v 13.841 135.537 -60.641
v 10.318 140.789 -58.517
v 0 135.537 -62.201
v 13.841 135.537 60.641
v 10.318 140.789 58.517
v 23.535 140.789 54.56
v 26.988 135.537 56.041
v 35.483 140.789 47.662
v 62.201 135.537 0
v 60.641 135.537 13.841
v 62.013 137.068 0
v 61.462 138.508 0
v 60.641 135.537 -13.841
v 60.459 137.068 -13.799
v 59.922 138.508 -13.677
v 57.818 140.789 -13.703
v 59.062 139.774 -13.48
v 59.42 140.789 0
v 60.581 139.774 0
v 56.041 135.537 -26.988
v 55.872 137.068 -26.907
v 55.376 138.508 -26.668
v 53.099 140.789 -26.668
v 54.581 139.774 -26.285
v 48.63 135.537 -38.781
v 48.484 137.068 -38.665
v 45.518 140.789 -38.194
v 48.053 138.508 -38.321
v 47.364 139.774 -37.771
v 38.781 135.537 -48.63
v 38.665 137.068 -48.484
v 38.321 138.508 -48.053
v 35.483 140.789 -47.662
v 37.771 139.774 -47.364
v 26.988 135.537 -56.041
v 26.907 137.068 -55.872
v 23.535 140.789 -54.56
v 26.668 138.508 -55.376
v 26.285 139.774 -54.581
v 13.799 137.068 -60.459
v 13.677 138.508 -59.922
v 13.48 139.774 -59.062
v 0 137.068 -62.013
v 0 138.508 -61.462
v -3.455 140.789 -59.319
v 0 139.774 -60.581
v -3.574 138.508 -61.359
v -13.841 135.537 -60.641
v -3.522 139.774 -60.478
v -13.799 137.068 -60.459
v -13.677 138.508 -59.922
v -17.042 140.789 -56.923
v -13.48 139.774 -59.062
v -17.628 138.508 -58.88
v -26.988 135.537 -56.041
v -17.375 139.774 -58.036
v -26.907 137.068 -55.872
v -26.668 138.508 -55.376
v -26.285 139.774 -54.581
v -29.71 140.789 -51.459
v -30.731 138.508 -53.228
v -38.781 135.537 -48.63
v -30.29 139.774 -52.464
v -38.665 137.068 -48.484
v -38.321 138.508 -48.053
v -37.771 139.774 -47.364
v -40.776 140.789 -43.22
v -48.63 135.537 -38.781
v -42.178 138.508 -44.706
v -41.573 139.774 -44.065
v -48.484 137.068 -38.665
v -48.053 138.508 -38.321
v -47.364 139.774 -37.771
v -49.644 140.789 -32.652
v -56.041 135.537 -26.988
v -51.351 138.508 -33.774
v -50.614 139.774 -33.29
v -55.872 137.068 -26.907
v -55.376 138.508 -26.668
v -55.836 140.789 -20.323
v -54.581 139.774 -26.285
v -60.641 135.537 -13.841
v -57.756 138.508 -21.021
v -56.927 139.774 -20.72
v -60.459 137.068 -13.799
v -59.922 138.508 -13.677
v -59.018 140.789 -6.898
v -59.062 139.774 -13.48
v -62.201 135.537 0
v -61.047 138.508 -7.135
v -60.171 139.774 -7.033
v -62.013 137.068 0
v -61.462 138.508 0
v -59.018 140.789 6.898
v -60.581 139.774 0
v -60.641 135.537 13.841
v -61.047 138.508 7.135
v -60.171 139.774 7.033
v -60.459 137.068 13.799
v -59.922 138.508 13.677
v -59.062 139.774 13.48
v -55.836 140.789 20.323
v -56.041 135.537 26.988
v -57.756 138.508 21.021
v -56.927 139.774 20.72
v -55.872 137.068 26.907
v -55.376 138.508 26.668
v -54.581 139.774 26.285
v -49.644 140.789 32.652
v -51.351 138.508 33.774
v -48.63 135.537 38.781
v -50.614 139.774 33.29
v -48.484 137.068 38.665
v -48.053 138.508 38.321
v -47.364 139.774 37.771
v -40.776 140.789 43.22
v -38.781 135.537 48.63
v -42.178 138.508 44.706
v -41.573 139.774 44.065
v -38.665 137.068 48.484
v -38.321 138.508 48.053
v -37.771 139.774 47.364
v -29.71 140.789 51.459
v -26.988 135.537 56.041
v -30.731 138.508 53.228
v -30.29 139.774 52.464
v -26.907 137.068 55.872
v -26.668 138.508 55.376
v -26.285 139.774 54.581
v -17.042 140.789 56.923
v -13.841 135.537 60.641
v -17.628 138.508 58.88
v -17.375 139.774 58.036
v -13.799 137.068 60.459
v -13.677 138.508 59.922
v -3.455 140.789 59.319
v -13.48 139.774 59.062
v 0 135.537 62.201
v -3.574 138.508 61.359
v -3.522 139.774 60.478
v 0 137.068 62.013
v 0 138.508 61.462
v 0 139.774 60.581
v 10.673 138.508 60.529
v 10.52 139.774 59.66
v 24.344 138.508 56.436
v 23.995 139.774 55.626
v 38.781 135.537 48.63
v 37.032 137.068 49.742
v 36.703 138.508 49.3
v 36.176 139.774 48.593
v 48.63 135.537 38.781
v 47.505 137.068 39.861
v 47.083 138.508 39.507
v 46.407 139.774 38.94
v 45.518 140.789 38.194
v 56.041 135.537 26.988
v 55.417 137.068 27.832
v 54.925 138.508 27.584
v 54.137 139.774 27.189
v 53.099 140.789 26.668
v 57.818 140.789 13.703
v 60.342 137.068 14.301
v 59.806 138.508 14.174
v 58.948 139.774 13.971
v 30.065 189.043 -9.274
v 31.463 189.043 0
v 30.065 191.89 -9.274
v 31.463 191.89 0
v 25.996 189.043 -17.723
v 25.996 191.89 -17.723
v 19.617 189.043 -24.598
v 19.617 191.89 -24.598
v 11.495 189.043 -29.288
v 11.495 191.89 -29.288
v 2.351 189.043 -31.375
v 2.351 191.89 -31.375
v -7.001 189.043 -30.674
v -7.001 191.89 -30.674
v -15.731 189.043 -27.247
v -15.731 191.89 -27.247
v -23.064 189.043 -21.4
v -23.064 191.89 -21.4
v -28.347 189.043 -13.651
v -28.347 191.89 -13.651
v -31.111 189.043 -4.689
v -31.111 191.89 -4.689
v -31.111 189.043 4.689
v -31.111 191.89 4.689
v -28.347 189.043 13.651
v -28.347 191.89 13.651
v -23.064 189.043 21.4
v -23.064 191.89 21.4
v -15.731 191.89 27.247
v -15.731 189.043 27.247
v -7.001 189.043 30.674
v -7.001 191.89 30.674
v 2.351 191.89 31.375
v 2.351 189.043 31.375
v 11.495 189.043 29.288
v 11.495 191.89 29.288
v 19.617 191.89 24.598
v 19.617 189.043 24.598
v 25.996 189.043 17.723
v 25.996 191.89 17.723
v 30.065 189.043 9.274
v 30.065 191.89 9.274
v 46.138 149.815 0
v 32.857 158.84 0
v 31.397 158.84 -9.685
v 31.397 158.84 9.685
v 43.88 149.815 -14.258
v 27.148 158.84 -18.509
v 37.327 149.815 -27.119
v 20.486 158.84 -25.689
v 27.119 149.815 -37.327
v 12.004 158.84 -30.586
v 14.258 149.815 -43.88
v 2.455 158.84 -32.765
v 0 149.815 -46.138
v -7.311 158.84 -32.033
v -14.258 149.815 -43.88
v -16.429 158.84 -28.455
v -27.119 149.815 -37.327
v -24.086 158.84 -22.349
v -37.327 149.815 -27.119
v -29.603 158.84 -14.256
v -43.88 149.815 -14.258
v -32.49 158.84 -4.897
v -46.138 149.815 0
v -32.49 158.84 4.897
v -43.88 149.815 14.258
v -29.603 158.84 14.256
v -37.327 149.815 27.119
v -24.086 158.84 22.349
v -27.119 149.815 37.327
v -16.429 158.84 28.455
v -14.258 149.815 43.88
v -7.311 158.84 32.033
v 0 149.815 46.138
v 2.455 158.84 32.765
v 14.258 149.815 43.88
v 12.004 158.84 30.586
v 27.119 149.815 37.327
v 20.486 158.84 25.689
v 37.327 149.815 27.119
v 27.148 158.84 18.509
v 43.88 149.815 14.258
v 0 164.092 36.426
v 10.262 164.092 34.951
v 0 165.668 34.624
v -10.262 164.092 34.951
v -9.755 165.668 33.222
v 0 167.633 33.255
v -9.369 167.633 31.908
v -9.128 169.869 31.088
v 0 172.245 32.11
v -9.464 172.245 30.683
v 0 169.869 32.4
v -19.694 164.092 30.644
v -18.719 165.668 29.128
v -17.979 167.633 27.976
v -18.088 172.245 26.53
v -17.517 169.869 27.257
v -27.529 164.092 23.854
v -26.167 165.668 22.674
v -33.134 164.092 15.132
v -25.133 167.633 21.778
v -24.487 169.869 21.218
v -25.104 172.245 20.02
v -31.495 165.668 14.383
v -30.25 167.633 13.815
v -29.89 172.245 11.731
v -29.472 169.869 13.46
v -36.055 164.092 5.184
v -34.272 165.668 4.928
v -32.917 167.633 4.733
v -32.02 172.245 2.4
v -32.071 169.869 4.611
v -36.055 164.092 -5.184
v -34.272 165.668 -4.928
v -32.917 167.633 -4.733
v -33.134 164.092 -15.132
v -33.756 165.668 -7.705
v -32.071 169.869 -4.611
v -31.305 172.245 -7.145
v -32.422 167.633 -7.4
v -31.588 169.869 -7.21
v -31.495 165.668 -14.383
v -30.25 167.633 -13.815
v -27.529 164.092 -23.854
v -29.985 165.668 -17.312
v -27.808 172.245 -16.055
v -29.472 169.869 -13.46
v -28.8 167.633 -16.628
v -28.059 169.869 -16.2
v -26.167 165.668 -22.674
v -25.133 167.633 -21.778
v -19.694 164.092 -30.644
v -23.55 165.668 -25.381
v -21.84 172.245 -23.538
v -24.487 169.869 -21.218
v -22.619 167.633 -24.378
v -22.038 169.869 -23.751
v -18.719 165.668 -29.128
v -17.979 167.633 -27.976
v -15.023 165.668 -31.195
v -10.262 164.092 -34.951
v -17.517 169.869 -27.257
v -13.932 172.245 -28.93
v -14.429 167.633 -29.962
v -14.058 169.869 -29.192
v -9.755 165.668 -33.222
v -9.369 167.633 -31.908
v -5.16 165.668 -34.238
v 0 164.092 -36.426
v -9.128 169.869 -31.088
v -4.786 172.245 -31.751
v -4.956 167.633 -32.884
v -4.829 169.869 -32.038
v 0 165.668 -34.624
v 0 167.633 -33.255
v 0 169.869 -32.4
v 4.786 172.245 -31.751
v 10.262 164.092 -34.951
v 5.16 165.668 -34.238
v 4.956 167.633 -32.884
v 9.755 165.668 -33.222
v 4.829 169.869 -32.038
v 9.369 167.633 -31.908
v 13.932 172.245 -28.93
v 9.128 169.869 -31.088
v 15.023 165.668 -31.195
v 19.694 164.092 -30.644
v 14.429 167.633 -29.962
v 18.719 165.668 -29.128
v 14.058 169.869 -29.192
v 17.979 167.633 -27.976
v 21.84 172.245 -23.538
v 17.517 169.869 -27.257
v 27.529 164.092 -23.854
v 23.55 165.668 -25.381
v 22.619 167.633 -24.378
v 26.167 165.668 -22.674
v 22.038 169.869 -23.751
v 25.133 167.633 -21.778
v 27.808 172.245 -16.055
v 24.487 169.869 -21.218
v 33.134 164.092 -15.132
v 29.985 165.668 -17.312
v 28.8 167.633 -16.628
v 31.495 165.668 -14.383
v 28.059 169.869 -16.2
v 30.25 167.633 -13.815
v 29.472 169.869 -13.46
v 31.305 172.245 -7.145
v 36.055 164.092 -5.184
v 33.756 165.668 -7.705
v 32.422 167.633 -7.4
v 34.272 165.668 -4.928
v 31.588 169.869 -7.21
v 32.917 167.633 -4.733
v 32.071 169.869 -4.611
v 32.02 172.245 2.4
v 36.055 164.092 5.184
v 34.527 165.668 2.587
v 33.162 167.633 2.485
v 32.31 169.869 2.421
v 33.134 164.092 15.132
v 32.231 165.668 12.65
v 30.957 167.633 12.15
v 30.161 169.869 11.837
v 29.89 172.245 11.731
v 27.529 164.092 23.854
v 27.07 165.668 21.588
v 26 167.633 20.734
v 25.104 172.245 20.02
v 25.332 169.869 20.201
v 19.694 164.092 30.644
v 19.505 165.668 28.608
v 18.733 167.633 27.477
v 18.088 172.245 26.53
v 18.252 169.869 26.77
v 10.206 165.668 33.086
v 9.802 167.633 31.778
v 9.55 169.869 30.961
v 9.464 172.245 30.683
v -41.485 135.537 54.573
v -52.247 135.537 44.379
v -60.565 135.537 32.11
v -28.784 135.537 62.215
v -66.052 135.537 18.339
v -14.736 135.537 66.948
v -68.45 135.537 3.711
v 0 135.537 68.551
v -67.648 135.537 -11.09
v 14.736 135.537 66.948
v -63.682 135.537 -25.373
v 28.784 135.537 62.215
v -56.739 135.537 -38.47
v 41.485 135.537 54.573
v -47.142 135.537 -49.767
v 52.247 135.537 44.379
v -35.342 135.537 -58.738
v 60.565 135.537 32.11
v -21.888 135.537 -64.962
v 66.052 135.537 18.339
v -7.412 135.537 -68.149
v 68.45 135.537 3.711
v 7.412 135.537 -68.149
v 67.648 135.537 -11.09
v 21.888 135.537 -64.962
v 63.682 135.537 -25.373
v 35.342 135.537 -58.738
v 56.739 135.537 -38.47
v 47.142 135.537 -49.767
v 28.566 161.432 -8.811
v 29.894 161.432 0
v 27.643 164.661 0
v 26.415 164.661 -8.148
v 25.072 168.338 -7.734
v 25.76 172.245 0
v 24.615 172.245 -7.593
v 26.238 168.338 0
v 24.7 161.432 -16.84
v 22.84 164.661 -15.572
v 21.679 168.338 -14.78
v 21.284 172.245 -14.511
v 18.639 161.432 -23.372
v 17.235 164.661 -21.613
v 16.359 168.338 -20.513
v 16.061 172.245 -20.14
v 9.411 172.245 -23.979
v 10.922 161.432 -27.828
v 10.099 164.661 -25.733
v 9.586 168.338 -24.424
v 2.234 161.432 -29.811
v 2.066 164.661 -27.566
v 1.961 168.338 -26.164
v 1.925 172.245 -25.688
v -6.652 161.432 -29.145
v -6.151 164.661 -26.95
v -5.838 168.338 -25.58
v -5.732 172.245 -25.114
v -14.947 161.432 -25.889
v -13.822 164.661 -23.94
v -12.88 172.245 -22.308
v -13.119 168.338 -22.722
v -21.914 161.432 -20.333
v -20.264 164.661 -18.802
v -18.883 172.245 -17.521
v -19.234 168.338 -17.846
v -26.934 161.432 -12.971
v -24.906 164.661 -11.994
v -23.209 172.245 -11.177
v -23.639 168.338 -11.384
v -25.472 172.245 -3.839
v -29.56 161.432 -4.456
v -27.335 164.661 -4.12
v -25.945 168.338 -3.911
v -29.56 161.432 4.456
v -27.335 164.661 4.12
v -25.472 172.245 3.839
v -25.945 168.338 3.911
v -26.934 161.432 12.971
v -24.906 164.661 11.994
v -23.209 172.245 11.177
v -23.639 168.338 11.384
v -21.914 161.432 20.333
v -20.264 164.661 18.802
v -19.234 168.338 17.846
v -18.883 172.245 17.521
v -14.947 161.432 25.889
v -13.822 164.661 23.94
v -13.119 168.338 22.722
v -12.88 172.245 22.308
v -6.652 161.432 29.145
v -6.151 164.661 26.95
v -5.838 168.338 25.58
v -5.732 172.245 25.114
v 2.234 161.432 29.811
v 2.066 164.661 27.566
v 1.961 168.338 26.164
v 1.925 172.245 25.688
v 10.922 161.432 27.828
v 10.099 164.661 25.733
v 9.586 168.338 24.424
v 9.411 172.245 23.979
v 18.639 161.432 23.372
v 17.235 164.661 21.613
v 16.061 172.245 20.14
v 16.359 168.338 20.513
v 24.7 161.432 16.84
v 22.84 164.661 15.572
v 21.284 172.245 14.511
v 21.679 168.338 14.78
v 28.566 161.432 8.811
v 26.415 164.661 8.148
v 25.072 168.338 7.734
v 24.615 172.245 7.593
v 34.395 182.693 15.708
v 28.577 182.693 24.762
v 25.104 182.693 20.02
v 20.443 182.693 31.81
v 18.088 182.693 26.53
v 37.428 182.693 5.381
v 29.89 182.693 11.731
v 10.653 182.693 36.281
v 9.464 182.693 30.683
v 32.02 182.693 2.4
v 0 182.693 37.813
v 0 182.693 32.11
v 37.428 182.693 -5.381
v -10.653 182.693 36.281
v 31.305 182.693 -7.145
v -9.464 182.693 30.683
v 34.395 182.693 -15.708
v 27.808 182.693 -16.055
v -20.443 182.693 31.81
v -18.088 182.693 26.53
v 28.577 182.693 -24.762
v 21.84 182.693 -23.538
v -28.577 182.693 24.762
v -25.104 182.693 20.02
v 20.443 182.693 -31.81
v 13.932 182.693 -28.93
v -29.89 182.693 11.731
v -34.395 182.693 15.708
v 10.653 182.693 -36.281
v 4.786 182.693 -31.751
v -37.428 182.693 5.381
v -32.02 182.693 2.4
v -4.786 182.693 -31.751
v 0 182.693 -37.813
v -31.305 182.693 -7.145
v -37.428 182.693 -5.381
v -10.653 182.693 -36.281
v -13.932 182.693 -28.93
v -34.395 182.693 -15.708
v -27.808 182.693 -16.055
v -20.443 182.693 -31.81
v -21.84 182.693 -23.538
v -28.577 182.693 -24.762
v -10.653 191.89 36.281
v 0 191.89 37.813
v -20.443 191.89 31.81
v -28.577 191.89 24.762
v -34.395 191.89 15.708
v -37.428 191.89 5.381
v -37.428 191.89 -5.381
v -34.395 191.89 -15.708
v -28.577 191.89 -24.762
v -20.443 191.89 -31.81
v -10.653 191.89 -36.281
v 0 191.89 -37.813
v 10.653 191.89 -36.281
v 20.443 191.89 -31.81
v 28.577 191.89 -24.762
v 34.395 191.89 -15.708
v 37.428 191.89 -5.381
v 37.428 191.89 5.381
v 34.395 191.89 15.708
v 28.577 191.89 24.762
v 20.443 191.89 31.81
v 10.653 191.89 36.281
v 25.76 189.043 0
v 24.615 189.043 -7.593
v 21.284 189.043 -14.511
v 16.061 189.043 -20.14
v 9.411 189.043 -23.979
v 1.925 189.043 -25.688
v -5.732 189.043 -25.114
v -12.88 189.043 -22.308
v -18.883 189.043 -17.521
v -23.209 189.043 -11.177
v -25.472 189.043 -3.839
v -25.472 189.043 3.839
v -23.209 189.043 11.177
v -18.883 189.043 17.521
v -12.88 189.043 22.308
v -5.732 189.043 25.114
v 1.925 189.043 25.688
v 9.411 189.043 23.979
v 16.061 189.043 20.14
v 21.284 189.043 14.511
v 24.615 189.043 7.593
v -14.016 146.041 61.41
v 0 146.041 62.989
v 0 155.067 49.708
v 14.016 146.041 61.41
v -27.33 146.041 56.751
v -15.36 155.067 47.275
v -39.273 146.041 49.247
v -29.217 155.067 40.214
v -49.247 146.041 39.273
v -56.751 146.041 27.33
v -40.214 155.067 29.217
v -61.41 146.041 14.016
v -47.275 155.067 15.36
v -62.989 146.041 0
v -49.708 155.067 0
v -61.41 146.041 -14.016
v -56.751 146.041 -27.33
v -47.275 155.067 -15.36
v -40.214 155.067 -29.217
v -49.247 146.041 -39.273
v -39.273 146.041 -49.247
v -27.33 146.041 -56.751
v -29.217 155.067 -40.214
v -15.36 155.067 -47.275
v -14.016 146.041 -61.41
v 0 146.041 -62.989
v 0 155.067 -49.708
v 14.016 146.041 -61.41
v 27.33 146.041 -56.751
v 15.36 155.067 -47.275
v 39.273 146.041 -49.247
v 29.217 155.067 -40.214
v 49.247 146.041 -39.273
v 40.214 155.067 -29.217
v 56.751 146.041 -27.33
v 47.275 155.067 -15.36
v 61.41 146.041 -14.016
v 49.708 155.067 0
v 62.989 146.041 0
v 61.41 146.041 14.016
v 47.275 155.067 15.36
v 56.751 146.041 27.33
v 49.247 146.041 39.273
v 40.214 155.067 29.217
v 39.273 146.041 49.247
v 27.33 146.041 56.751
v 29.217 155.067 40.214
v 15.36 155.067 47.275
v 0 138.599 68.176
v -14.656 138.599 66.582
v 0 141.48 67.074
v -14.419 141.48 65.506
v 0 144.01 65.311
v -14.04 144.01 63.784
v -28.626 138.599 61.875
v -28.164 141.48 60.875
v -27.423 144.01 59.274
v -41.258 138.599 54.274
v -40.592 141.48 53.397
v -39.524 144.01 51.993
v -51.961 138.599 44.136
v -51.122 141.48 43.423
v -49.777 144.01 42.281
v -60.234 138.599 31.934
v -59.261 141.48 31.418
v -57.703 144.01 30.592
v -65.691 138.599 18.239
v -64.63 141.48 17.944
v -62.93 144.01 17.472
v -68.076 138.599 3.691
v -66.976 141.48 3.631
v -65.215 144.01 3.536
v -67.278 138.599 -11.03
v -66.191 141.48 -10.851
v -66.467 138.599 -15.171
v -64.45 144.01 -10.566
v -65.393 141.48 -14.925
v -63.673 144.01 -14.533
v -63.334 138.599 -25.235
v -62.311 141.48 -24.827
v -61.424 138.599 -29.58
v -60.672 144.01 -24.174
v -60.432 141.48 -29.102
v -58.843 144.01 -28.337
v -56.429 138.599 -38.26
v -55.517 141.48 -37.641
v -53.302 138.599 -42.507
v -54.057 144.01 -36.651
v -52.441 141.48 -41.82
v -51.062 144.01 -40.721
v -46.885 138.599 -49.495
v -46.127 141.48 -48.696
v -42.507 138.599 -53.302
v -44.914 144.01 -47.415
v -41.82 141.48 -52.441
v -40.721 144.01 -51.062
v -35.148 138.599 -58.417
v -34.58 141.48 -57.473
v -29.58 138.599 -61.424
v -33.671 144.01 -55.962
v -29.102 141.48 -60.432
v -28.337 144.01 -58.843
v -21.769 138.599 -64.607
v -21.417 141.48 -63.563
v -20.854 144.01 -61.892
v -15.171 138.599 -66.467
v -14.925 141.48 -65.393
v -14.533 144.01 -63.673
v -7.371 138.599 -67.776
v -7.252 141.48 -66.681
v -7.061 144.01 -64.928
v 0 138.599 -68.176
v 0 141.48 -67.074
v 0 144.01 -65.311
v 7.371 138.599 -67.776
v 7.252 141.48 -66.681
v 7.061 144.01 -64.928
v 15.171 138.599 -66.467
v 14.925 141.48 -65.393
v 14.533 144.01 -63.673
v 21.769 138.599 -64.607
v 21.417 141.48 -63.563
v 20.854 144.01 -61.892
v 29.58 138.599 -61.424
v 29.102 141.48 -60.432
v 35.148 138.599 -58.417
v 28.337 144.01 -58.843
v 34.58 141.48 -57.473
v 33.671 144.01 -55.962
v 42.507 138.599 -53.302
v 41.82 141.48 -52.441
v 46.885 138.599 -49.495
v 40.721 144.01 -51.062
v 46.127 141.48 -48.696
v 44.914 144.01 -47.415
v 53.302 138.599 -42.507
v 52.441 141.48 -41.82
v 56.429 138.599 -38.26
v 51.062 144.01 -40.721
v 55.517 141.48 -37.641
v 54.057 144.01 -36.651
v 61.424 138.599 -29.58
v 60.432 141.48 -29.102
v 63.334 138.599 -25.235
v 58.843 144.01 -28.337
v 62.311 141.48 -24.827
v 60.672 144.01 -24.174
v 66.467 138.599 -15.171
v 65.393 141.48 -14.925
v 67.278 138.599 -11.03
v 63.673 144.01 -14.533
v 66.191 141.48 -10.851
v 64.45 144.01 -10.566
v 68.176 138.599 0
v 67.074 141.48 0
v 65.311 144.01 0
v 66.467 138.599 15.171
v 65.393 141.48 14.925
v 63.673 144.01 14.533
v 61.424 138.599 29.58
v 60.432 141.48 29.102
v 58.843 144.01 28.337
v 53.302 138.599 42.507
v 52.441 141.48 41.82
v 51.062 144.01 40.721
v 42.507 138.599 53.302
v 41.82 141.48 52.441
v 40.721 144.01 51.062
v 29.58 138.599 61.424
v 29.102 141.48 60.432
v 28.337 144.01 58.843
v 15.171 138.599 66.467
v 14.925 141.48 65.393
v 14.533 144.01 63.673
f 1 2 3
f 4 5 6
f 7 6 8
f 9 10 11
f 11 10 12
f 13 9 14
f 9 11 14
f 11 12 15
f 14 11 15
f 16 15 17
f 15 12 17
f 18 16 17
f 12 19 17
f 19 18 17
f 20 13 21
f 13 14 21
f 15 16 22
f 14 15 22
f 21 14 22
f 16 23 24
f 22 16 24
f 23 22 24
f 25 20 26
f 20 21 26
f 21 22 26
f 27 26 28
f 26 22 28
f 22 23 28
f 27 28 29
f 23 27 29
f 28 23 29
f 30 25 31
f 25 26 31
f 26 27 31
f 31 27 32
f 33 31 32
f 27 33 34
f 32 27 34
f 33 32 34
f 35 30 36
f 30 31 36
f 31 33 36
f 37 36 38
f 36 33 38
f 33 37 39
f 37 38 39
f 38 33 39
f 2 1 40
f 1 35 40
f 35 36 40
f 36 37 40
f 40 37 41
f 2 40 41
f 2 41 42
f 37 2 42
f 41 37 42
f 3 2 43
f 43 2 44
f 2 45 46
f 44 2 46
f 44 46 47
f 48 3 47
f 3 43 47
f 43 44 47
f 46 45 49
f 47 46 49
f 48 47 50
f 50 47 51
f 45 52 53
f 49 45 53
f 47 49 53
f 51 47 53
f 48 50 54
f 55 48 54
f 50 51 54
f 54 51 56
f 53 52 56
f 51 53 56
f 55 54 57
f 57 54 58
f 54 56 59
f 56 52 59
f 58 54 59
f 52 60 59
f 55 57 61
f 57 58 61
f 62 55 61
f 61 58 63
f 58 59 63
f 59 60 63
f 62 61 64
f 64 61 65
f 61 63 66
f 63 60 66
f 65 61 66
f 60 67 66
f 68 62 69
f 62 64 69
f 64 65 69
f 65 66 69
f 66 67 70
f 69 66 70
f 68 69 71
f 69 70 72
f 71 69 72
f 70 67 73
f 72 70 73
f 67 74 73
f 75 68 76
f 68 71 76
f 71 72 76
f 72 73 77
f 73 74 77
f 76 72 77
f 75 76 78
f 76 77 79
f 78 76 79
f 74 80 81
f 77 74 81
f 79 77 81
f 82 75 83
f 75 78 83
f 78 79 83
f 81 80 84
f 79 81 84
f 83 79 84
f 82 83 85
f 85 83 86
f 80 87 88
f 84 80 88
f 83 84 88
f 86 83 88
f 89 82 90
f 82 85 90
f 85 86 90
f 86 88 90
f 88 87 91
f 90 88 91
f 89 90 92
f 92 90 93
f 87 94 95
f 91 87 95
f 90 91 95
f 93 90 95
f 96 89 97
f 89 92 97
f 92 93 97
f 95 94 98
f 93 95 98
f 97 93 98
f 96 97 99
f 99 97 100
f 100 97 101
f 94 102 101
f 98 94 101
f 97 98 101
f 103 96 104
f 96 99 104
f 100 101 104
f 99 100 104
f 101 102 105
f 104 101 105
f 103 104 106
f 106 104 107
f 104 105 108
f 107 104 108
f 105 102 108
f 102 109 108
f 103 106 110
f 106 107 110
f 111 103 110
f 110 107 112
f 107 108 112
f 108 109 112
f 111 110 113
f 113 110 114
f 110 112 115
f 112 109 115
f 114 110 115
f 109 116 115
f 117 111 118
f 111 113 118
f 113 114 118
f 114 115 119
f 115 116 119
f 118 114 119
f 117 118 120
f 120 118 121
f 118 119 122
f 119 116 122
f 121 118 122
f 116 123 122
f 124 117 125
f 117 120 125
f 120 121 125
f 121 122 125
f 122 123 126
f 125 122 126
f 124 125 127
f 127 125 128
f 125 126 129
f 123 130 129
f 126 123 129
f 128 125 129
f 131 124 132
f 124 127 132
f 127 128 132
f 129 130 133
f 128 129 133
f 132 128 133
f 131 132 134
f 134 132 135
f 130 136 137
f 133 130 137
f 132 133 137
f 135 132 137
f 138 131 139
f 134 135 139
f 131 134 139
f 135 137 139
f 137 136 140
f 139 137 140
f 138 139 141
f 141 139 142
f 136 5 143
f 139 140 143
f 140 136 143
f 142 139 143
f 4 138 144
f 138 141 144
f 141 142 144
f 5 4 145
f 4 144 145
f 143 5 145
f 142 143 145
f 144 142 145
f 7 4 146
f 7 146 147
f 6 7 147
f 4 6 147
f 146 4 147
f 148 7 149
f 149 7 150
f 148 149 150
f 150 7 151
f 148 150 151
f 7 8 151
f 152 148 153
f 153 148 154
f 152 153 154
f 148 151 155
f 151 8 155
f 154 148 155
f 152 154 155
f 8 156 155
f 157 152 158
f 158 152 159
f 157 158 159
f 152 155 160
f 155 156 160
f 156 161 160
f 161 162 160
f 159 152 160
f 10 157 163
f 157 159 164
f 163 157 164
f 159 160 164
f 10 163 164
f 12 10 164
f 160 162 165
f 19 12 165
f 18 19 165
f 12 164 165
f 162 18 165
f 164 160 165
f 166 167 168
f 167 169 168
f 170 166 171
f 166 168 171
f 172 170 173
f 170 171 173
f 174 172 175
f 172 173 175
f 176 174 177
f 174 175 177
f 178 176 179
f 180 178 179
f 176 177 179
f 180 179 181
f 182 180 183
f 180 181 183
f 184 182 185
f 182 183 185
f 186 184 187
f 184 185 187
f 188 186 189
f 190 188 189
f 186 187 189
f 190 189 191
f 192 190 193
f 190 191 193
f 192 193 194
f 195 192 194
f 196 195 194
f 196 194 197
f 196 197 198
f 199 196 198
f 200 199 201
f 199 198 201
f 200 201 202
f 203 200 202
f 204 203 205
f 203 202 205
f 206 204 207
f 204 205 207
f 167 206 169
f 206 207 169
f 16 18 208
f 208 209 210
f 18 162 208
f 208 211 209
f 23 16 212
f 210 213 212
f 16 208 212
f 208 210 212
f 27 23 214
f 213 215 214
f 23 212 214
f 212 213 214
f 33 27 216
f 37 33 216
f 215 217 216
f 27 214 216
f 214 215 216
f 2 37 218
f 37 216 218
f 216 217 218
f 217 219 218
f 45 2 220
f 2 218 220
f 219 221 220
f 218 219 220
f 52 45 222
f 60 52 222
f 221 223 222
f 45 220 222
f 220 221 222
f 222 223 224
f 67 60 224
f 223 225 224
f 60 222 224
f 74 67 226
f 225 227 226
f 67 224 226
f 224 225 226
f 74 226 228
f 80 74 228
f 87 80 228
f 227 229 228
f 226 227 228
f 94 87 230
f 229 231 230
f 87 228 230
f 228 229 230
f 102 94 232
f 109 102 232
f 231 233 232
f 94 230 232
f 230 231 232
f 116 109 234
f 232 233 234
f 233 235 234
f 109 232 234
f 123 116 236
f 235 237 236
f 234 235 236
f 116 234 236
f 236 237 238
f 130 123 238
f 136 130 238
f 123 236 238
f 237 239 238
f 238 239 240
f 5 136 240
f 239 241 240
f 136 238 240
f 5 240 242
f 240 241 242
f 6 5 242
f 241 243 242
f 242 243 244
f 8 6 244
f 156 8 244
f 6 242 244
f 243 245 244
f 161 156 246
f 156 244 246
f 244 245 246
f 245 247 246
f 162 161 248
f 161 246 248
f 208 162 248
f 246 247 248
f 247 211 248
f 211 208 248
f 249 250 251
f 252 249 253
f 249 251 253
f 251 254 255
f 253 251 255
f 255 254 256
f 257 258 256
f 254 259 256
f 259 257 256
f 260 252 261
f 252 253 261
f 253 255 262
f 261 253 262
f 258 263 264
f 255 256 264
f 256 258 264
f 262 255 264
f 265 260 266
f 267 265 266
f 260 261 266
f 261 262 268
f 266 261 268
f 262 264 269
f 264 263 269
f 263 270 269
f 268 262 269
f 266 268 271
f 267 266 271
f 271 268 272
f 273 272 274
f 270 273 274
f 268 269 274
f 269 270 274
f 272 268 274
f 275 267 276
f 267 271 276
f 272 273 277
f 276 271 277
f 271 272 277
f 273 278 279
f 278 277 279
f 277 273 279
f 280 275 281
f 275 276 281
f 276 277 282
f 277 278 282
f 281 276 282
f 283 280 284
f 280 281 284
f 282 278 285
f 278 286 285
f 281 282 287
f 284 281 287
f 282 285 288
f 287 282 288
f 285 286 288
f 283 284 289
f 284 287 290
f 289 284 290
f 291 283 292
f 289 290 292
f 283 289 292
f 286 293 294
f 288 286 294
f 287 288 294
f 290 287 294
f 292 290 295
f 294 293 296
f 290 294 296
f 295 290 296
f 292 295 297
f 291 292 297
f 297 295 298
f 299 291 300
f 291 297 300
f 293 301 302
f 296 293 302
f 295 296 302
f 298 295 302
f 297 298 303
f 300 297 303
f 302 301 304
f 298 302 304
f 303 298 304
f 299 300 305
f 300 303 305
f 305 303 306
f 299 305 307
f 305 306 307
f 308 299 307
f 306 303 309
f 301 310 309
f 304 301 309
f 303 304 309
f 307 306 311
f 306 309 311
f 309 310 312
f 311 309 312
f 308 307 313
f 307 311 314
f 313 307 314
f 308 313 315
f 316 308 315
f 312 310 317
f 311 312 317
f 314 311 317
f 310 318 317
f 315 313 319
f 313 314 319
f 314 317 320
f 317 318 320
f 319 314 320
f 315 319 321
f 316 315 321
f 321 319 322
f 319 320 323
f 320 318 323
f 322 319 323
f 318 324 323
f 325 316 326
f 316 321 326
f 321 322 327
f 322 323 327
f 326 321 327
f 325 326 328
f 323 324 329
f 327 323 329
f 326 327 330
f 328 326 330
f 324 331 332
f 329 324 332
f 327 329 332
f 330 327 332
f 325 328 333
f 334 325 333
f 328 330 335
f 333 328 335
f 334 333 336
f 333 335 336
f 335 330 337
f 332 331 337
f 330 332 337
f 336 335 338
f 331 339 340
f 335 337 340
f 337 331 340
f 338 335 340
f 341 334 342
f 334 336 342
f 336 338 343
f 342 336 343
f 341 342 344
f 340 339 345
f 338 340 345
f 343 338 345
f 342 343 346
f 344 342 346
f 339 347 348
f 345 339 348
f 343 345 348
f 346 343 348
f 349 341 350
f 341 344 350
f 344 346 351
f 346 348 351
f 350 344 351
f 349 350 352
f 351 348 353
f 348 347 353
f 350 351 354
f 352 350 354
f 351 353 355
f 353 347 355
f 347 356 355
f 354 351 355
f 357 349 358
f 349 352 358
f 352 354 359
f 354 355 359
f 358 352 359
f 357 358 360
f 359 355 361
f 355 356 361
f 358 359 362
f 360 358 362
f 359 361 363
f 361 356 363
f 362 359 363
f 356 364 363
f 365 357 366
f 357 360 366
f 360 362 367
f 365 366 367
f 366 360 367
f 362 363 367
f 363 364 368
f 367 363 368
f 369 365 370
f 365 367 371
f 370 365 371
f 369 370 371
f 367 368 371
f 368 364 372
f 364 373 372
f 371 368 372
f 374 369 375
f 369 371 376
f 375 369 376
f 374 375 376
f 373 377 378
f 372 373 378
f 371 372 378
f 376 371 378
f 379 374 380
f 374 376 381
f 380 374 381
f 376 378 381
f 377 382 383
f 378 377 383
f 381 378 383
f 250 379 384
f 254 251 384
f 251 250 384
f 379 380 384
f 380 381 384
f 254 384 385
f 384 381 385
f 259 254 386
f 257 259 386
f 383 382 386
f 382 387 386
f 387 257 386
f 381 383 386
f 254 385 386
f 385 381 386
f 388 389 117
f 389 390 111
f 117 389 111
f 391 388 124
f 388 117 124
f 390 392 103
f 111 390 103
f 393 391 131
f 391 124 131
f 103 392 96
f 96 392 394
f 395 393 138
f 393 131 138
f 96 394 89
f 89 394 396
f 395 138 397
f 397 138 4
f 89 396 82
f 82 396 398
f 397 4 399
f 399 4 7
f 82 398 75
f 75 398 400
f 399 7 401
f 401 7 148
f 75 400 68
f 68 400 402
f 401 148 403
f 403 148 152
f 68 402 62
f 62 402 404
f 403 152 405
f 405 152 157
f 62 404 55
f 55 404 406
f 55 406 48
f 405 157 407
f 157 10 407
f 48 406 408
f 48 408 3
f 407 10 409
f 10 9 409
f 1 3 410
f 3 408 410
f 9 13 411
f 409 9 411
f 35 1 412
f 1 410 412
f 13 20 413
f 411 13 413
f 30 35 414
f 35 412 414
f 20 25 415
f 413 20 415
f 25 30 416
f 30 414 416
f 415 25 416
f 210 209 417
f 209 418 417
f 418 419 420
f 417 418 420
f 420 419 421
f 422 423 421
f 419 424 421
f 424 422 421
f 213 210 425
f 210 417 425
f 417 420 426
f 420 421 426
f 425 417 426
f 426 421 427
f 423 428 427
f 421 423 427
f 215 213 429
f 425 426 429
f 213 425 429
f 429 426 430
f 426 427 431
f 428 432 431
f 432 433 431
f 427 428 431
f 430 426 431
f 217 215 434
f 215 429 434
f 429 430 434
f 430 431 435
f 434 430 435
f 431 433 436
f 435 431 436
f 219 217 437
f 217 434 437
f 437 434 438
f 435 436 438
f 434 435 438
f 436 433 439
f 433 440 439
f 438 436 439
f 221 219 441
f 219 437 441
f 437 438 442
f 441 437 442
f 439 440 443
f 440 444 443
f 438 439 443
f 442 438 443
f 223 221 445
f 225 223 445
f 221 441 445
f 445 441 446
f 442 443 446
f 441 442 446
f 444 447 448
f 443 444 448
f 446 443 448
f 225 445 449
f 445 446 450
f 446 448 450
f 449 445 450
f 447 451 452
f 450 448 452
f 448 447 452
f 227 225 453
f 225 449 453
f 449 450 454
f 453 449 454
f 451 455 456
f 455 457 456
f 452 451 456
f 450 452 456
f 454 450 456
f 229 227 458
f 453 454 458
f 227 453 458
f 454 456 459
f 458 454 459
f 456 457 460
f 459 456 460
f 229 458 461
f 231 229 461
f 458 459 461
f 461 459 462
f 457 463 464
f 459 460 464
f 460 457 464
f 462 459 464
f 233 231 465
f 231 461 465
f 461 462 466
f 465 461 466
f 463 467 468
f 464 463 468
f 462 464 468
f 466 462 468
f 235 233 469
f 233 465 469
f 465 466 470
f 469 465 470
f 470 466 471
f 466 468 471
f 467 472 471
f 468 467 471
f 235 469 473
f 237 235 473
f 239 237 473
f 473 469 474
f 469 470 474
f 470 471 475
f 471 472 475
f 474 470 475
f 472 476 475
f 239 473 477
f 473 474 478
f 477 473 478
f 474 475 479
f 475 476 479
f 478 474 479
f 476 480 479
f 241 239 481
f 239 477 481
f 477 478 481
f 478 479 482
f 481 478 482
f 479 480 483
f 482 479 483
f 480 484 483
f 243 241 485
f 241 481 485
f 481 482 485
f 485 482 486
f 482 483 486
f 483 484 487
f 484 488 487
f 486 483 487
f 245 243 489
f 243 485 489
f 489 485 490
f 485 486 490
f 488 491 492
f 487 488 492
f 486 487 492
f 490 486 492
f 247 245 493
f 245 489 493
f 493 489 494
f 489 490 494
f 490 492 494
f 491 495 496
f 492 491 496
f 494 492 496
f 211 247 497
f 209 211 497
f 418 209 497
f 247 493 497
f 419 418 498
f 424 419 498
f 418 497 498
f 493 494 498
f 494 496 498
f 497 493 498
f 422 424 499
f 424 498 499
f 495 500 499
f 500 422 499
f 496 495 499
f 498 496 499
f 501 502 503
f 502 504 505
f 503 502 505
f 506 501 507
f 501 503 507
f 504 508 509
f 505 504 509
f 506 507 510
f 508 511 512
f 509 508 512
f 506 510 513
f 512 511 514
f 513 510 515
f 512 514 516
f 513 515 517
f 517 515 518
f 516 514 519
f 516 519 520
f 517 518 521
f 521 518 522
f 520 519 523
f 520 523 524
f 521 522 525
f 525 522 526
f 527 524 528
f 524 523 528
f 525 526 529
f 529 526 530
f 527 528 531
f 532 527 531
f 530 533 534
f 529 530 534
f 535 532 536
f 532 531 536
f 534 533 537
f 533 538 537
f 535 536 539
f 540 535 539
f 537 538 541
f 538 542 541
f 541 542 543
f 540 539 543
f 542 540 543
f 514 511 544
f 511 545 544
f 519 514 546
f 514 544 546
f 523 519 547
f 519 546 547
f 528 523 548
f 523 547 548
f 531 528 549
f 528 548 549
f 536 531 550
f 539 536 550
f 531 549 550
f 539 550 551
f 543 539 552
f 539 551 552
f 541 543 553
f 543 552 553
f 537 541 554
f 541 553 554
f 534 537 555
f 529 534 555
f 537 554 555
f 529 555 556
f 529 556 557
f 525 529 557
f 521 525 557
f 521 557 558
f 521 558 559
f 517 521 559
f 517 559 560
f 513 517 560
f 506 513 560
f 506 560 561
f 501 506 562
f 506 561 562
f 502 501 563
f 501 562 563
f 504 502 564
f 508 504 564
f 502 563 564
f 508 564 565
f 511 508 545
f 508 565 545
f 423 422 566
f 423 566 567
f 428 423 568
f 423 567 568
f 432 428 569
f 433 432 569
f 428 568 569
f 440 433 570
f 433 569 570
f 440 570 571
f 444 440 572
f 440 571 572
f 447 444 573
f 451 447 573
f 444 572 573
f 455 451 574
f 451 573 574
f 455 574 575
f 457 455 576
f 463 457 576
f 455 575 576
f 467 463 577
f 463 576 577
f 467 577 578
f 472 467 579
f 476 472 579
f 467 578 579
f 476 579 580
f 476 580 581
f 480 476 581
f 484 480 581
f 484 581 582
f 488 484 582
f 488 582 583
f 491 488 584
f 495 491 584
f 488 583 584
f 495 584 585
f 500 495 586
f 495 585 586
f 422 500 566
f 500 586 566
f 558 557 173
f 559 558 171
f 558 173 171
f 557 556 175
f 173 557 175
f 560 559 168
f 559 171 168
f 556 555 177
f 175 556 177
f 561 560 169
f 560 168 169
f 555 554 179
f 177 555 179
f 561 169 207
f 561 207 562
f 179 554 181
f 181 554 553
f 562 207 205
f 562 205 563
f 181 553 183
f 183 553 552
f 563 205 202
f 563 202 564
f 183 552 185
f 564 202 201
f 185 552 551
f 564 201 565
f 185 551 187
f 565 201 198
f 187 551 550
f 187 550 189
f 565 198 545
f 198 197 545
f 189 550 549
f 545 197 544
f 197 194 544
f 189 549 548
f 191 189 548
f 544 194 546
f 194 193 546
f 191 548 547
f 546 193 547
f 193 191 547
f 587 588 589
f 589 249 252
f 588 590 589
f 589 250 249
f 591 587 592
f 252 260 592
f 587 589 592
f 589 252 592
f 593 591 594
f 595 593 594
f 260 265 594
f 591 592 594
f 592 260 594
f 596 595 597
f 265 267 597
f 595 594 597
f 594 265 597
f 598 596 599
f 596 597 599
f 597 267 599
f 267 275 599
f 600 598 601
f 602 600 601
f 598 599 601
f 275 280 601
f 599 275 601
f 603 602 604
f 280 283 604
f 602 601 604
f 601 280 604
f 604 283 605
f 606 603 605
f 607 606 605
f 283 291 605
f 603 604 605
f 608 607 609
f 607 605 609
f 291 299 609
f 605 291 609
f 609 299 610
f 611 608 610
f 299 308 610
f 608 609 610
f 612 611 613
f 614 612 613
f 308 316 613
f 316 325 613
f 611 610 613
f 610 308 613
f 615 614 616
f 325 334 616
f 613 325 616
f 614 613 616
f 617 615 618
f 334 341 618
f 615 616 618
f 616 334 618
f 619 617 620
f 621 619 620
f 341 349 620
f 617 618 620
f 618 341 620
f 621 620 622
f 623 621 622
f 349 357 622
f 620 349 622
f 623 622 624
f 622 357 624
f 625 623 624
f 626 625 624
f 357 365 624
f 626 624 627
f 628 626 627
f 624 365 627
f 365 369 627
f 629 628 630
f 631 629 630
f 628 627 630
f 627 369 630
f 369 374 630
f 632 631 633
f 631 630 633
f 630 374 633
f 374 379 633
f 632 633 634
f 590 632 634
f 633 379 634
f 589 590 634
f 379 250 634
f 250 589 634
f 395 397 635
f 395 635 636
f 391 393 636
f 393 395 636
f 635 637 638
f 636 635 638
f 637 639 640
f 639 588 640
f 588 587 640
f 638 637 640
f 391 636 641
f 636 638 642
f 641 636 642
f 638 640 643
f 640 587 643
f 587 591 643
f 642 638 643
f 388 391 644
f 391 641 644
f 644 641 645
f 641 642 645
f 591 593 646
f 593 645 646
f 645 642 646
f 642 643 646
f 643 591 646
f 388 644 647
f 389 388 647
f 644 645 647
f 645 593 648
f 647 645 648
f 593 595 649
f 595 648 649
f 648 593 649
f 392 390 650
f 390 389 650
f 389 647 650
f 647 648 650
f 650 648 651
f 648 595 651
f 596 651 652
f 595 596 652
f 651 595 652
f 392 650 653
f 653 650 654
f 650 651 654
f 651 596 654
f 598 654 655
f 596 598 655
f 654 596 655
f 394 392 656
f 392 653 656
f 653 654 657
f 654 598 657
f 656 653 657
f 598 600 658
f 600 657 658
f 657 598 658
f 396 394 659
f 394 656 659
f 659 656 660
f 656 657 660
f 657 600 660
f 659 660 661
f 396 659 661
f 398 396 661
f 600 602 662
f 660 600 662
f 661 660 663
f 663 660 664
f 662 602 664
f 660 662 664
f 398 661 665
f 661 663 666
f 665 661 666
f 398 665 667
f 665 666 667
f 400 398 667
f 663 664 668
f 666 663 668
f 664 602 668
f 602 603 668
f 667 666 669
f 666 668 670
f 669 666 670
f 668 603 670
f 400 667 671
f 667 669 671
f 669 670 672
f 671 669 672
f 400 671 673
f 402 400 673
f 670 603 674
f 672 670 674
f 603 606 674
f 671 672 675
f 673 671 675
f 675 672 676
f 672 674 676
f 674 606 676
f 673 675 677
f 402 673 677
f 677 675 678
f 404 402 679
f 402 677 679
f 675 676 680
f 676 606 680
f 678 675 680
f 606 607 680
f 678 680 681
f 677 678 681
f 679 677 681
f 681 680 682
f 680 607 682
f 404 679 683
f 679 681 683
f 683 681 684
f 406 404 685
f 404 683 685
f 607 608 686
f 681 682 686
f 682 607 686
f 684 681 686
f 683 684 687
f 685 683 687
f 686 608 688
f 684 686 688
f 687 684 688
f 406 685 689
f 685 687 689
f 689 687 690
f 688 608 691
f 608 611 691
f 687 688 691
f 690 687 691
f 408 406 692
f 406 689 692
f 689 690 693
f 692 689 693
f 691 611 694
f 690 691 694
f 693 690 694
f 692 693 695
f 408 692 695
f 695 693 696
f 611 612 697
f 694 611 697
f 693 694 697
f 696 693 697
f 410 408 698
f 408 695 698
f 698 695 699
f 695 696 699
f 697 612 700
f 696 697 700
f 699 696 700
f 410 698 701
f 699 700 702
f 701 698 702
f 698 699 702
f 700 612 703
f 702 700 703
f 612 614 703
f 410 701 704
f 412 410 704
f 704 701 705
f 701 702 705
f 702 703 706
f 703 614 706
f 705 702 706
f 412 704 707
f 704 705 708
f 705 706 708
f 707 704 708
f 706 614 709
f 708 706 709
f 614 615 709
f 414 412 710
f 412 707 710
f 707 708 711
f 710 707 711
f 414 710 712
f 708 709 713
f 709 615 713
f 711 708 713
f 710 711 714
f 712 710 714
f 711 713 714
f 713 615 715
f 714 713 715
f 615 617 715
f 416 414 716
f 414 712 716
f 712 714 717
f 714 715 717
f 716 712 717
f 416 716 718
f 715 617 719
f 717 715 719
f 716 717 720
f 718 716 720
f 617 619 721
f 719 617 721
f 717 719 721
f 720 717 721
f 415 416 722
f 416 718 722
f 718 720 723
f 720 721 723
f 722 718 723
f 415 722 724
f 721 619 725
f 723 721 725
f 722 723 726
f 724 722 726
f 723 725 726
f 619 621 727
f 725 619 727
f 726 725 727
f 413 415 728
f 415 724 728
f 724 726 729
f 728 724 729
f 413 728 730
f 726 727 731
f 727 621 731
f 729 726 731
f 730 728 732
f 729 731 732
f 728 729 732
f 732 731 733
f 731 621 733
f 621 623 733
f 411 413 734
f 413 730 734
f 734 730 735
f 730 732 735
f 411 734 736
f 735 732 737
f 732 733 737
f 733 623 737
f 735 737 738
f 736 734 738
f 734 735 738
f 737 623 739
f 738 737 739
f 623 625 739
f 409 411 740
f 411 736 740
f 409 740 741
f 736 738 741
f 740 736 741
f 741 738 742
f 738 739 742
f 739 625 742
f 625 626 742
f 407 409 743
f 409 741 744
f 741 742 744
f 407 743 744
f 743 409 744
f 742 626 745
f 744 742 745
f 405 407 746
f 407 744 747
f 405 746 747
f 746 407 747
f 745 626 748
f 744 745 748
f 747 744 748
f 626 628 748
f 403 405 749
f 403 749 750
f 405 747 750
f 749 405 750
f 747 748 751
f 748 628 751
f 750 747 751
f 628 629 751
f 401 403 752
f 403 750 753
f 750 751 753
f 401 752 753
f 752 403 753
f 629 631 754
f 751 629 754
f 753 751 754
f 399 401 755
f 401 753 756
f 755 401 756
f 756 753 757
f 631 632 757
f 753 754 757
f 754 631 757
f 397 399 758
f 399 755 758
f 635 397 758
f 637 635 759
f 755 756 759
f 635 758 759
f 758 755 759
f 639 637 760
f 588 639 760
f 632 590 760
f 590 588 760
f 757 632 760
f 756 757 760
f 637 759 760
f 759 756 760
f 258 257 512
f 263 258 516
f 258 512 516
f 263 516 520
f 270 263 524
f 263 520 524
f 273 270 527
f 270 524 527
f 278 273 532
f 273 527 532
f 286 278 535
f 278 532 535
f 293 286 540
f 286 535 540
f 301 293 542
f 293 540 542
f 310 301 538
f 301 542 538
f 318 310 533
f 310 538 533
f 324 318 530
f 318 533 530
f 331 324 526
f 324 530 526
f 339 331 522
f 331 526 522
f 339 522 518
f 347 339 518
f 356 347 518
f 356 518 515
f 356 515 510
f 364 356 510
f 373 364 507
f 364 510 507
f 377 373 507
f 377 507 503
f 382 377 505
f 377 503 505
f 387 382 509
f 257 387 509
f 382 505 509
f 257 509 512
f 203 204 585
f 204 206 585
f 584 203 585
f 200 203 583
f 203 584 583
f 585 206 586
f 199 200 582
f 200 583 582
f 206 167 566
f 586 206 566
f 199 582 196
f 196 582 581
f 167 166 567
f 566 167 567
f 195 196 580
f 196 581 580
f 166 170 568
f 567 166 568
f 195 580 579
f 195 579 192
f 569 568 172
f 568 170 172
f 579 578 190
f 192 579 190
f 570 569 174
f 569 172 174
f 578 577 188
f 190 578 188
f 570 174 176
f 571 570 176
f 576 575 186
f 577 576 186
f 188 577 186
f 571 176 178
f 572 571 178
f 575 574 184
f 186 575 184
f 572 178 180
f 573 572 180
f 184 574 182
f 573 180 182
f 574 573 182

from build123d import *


# Read off the part's stored shape, not the designer's step: Shell1
with BuildPart() as part:
    # Sketch1 → Revolve1 (revolve)
    with BuildSketch(Plane.XY, mode=Mode.PRIVATE) as revolve1_sk:
        with BuildLine():
            Line((0, 0), (55.850610629, 0))
            ThreePointArc((55.850610629, 0), (64.83086675, 3.719743879), (68.550610629, 12.7))
            Line((68.550610629, 12.7), (68.550610629, 135.537090781))
            ThreePointArc((68.550610629, 135.537090781), (67.07437947, 141.479902659), (62.988876295, 146.041145392))
            Line((62.988876295, 146.041145392), (36.426242146, 164.092378593))
            ThreePointArc((36.426242146, 164.092378593), (33.255344861, 167.632513451), (32.109591896, 172.244930881))
            Line((32.109591896, 172.244930881), (32.109591896, 182.693006016))
            Line((32.109591896, 182.693006016), (37.812538782, 182.693006016))
            Line((37.812538782, 182.693006016), (37.812538782, 191.889991998))
            Line((37.812538782, 191.889991998), (0, 191.889991998))
            Line((0, 191.889991998), (0, 0))
        make_face()
    revolve(revolve1_sk.sketch.rotate(Axis((0, 191.889991998, 0), (0, -1, 0)), 90), axis=Axis((0, 191.889991998, 0), (0, -1, 0)))

    # Shell1 outline → Shell1 (revolve, cut)
    with BuildSketch(Plane.XY):
        with BuildLine():
            Line((68.550610629, 135.537090781), (62.200610629, 135.537090781))
            ThreePointArc((62.200610629, 135.537090781), (61.462495049, 138.50849672), (59.419743462, 140.789118087))
            Line((59.419743462, 140.789118087), (32.857109313, 158.840351287))
            ThreePointArc((32.857109313, 158.840351287), (27.643460441, 164.661107512), (25.759591896, 172.244930881))
            Line((25.759591896, 172.244930881), (25.759591896, 189.043006016))
            Line((25.759591896, 189.043006016), (31.462538782, 189.043006016))
            Line((31.462538782, 189.043006016), (31.462538782, 191.889991998))
            Line((31.462538782, 191.889991998), (0, 191.889991998))
            Line((0, 191.889991998), (0, 0))
            Line((0, 0), (55.850610629, 0))
            ThreePointArc((55.850610629, 0), (64.83086675, 3.719743879), (68.550610629, 12.7))
            Line((68.550610629, 12.7), (68.550610629, 135.537090781))
        make_face()
    revolve(axis=Axis((0, 0, 0), (0, 1, 0)), mode=Mode.SUBTRACT)


solid = part.part
